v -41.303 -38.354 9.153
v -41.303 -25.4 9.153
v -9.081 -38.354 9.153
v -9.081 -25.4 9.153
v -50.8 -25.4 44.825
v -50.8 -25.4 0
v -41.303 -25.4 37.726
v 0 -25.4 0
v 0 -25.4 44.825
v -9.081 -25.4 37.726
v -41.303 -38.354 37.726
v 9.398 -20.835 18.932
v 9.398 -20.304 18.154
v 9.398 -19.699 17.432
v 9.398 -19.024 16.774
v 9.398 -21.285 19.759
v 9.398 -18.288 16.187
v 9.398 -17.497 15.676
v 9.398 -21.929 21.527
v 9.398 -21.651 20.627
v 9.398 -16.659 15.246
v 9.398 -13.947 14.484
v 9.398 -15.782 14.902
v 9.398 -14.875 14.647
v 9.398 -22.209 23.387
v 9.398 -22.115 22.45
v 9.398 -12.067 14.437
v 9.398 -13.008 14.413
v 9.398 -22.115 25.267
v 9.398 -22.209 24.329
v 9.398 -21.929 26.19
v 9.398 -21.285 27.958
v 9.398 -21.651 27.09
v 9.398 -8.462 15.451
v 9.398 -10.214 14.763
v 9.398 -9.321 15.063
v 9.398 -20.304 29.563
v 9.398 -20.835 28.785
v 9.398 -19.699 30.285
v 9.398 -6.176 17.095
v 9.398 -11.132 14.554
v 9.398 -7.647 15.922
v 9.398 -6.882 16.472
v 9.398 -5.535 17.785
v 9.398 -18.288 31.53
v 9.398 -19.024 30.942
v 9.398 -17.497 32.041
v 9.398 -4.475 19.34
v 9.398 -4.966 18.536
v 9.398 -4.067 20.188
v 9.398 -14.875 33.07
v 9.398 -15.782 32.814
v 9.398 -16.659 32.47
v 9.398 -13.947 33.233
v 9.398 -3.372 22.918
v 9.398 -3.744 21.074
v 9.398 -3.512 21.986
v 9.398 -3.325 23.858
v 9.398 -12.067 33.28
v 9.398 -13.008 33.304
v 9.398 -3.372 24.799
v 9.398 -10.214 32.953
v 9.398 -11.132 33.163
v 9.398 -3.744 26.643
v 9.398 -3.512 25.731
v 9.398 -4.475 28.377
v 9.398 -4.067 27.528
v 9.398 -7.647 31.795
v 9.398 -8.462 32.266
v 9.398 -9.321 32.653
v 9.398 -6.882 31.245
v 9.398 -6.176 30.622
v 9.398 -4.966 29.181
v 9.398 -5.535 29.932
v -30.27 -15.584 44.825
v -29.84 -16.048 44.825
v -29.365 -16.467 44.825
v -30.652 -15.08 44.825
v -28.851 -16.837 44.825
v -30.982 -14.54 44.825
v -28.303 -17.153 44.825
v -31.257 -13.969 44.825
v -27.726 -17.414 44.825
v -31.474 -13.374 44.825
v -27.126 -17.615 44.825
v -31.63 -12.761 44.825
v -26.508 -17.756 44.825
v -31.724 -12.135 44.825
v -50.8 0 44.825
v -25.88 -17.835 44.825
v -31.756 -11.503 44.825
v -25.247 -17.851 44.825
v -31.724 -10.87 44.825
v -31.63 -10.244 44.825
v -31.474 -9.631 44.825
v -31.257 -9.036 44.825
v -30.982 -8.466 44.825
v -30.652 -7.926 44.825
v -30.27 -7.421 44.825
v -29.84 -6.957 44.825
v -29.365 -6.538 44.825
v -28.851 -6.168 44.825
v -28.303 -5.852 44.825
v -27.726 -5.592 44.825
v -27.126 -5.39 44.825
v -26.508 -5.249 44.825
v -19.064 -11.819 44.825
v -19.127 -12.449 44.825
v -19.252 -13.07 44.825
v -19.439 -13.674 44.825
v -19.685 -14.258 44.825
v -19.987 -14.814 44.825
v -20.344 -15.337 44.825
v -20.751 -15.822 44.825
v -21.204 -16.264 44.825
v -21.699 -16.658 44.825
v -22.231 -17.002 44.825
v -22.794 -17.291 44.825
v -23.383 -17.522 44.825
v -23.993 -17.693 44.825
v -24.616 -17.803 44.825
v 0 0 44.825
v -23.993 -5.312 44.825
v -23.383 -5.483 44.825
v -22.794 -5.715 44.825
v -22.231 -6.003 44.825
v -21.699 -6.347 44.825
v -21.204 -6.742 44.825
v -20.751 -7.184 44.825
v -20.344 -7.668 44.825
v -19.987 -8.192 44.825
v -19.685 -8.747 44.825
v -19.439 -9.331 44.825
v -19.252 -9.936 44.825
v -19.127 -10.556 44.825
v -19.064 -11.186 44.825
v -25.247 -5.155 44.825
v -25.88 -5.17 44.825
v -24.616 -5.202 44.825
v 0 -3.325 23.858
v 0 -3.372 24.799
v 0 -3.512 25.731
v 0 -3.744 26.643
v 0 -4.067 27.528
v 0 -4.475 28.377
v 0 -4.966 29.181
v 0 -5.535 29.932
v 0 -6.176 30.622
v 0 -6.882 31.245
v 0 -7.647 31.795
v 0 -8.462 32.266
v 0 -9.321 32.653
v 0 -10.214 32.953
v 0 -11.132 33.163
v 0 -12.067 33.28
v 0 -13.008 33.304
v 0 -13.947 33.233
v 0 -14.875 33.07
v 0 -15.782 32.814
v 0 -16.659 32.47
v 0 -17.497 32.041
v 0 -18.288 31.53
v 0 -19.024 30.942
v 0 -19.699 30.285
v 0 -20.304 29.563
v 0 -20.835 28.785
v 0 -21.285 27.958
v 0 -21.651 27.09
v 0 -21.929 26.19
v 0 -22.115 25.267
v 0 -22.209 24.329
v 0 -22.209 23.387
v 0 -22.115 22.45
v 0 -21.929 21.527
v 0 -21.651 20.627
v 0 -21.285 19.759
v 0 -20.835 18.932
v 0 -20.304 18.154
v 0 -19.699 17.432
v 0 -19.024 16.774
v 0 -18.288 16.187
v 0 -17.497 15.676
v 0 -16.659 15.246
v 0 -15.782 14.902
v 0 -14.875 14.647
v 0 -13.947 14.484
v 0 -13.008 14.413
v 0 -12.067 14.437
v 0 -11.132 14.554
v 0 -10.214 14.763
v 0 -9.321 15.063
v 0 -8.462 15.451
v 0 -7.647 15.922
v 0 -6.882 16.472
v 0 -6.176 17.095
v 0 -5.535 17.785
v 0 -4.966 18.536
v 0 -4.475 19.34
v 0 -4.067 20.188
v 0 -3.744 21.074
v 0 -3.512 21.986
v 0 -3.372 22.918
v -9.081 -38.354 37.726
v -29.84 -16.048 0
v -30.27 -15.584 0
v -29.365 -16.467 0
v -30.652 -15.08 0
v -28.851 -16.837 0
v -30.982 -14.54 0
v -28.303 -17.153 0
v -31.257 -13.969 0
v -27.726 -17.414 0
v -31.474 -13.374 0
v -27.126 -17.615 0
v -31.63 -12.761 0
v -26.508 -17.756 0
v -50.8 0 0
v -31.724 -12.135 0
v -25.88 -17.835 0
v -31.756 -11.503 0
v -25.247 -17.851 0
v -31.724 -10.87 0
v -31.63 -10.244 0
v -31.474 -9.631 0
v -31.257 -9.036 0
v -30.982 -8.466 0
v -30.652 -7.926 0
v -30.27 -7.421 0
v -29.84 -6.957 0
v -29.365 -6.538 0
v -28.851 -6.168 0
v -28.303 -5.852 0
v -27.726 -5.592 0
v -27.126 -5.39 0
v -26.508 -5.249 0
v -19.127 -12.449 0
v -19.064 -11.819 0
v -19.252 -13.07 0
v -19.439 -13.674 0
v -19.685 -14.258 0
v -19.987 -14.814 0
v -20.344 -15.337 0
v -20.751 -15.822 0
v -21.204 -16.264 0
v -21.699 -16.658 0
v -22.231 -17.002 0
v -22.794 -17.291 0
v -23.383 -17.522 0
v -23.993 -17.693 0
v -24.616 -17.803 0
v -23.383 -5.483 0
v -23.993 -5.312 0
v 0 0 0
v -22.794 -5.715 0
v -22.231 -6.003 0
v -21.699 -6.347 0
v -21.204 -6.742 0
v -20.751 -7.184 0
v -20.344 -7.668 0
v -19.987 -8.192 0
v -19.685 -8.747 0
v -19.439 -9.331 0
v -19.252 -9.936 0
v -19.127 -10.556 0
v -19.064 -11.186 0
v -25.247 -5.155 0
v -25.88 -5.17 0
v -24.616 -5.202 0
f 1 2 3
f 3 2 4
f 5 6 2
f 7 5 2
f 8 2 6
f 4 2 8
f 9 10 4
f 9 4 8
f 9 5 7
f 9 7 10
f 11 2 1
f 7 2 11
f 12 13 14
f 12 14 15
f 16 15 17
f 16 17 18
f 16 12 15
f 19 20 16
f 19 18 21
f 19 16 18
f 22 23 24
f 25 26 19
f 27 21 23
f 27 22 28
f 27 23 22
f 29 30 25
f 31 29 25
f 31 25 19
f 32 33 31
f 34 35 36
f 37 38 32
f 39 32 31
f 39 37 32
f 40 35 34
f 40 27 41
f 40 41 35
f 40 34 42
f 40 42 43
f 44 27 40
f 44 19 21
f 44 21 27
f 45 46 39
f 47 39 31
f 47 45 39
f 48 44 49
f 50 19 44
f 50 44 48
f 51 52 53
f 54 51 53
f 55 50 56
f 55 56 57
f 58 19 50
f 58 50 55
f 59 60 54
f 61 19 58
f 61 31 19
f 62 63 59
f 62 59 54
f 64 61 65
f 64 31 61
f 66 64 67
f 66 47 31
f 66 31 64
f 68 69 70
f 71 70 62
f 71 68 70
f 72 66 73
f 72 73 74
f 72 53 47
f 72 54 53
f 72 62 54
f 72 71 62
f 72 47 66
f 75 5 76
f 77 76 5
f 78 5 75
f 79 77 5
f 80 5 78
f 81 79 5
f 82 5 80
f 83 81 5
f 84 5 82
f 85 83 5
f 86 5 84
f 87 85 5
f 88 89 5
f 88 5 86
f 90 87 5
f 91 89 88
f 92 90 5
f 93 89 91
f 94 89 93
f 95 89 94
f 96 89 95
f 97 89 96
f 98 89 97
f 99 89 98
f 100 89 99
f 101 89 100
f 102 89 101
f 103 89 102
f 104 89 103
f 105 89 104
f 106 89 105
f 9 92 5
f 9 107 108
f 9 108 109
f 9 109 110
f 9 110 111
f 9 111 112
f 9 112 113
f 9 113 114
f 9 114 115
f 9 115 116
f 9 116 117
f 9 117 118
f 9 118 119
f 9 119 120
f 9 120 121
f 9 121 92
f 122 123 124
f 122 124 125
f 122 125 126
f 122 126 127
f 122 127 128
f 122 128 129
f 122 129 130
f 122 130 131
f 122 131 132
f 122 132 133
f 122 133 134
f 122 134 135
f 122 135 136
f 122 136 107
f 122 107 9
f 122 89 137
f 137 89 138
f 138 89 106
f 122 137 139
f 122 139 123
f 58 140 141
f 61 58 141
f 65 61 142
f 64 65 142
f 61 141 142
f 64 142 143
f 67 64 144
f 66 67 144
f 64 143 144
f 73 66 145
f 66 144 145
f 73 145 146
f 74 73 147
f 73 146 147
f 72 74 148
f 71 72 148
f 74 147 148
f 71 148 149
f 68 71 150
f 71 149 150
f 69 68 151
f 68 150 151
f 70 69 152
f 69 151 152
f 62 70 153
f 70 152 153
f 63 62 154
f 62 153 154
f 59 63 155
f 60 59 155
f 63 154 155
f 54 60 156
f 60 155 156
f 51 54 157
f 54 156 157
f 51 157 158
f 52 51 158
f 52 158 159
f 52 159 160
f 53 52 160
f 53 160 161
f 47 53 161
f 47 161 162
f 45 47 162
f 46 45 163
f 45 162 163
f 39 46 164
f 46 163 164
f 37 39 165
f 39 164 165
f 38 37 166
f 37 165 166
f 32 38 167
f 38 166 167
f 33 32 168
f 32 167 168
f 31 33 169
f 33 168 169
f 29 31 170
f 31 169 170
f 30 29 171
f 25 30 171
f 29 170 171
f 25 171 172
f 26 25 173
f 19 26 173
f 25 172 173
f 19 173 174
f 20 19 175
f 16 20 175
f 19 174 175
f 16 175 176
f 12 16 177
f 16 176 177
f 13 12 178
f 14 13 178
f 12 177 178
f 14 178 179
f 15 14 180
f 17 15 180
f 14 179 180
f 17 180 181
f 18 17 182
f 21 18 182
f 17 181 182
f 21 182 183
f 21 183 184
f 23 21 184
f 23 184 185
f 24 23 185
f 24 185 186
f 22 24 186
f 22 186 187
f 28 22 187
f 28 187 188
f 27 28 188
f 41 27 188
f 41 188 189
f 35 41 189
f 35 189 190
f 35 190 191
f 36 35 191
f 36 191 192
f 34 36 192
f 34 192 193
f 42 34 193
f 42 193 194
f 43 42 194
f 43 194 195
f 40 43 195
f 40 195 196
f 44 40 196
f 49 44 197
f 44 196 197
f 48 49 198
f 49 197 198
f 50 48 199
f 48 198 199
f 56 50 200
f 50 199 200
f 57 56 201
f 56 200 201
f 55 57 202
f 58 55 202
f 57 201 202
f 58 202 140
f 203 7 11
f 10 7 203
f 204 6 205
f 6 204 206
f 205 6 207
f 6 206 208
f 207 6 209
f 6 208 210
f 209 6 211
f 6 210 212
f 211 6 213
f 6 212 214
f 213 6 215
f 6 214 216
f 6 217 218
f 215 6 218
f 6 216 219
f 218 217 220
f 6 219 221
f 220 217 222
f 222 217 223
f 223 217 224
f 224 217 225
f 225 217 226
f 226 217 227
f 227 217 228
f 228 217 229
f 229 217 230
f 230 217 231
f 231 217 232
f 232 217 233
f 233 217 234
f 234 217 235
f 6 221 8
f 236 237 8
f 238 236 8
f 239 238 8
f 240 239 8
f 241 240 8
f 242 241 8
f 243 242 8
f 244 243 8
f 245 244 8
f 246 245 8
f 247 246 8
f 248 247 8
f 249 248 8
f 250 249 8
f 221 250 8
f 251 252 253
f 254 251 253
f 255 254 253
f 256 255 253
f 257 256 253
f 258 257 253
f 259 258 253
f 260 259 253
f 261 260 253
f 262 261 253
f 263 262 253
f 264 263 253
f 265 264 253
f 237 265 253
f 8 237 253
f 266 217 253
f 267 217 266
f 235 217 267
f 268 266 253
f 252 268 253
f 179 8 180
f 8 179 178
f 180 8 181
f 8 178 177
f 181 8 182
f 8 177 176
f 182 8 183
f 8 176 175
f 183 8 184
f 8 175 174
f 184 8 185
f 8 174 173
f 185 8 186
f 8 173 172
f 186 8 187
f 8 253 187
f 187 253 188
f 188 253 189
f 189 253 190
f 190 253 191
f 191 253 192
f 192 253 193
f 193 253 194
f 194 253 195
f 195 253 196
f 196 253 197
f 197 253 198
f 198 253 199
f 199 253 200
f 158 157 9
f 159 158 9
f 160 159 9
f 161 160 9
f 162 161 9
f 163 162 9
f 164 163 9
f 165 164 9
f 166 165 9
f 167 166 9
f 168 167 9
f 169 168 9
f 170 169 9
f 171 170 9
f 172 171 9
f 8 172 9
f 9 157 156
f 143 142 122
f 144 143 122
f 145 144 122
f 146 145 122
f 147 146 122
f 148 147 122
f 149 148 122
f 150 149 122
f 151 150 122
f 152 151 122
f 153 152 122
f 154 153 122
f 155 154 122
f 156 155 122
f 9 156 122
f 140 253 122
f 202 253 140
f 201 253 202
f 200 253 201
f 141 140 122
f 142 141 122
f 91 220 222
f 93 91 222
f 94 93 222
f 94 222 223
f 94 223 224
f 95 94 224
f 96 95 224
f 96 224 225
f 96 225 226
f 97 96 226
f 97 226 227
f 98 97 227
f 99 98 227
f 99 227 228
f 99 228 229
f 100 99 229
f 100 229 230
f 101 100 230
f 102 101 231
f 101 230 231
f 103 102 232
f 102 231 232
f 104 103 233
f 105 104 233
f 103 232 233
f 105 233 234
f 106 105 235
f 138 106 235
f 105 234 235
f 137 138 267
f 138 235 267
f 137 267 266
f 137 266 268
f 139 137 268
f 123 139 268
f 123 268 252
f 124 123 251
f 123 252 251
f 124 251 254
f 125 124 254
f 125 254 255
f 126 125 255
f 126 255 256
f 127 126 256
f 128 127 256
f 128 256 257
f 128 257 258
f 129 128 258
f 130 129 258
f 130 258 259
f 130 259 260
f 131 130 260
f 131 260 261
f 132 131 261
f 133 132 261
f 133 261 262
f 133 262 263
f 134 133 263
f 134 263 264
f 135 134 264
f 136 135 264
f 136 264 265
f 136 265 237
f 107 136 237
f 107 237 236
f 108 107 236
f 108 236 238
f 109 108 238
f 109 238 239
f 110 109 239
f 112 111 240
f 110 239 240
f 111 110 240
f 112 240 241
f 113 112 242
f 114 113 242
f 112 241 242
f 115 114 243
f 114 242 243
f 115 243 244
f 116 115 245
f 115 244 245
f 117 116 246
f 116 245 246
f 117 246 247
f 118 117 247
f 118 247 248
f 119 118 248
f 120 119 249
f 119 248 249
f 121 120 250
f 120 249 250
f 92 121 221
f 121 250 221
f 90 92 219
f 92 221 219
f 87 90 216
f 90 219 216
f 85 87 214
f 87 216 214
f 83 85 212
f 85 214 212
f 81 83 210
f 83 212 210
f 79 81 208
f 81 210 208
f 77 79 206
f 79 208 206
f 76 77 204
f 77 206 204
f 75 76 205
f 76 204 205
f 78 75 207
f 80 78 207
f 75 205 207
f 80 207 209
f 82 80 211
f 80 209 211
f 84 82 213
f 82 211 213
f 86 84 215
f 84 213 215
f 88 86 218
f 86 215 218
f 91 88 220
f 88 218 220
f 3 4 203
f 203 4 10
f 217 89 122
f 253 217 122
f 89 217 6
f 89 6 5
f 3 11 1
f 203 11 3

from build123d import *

# Parameters (mm, degrees)
F0_W     = 50.8
F0_H     = 44.824883
F1_DEPTH = 25.4
F3_D     = 12.7
F4_W     = 32.221506
F4_H     = 28.573785
F5_DEPTH = 12.954
F6_R     = 9.448071
F7_DEPTH = 9.398


with BuildPart() as f1:
    # F0 (on Front) → F1 (new body)
    with BuildSketch(Plane.XZ):
        with Locations((-25.4, 22.412441)):
            Rectangle(F0_W, F0_H)
    extrude(amount=F1_DEPTH)

    # F3 (through all)
    with Locations(Plane.XY.offset(44.824883)):
        with Locations((-25.40575, -11.502657)):
            Hole(F3_D / 2)

    # F4 (on face) → F5 (join)
    with BuildSketch(Plane.XZ.offset(25.4)):
        with Locations((-25.191973, 23.439532)):
            Rectangle(F4_W, F4_H)
    extrude(amount=F5_DEPTH)

    # F6 (on face) → F7 (join)
    with BuildSketch(Plane.YZ):
        with Locations((-12.772681, 23.858404)):
            Circle(F6_R)
    extrude(amount=F7_DEPTH)


solid = f1.part
